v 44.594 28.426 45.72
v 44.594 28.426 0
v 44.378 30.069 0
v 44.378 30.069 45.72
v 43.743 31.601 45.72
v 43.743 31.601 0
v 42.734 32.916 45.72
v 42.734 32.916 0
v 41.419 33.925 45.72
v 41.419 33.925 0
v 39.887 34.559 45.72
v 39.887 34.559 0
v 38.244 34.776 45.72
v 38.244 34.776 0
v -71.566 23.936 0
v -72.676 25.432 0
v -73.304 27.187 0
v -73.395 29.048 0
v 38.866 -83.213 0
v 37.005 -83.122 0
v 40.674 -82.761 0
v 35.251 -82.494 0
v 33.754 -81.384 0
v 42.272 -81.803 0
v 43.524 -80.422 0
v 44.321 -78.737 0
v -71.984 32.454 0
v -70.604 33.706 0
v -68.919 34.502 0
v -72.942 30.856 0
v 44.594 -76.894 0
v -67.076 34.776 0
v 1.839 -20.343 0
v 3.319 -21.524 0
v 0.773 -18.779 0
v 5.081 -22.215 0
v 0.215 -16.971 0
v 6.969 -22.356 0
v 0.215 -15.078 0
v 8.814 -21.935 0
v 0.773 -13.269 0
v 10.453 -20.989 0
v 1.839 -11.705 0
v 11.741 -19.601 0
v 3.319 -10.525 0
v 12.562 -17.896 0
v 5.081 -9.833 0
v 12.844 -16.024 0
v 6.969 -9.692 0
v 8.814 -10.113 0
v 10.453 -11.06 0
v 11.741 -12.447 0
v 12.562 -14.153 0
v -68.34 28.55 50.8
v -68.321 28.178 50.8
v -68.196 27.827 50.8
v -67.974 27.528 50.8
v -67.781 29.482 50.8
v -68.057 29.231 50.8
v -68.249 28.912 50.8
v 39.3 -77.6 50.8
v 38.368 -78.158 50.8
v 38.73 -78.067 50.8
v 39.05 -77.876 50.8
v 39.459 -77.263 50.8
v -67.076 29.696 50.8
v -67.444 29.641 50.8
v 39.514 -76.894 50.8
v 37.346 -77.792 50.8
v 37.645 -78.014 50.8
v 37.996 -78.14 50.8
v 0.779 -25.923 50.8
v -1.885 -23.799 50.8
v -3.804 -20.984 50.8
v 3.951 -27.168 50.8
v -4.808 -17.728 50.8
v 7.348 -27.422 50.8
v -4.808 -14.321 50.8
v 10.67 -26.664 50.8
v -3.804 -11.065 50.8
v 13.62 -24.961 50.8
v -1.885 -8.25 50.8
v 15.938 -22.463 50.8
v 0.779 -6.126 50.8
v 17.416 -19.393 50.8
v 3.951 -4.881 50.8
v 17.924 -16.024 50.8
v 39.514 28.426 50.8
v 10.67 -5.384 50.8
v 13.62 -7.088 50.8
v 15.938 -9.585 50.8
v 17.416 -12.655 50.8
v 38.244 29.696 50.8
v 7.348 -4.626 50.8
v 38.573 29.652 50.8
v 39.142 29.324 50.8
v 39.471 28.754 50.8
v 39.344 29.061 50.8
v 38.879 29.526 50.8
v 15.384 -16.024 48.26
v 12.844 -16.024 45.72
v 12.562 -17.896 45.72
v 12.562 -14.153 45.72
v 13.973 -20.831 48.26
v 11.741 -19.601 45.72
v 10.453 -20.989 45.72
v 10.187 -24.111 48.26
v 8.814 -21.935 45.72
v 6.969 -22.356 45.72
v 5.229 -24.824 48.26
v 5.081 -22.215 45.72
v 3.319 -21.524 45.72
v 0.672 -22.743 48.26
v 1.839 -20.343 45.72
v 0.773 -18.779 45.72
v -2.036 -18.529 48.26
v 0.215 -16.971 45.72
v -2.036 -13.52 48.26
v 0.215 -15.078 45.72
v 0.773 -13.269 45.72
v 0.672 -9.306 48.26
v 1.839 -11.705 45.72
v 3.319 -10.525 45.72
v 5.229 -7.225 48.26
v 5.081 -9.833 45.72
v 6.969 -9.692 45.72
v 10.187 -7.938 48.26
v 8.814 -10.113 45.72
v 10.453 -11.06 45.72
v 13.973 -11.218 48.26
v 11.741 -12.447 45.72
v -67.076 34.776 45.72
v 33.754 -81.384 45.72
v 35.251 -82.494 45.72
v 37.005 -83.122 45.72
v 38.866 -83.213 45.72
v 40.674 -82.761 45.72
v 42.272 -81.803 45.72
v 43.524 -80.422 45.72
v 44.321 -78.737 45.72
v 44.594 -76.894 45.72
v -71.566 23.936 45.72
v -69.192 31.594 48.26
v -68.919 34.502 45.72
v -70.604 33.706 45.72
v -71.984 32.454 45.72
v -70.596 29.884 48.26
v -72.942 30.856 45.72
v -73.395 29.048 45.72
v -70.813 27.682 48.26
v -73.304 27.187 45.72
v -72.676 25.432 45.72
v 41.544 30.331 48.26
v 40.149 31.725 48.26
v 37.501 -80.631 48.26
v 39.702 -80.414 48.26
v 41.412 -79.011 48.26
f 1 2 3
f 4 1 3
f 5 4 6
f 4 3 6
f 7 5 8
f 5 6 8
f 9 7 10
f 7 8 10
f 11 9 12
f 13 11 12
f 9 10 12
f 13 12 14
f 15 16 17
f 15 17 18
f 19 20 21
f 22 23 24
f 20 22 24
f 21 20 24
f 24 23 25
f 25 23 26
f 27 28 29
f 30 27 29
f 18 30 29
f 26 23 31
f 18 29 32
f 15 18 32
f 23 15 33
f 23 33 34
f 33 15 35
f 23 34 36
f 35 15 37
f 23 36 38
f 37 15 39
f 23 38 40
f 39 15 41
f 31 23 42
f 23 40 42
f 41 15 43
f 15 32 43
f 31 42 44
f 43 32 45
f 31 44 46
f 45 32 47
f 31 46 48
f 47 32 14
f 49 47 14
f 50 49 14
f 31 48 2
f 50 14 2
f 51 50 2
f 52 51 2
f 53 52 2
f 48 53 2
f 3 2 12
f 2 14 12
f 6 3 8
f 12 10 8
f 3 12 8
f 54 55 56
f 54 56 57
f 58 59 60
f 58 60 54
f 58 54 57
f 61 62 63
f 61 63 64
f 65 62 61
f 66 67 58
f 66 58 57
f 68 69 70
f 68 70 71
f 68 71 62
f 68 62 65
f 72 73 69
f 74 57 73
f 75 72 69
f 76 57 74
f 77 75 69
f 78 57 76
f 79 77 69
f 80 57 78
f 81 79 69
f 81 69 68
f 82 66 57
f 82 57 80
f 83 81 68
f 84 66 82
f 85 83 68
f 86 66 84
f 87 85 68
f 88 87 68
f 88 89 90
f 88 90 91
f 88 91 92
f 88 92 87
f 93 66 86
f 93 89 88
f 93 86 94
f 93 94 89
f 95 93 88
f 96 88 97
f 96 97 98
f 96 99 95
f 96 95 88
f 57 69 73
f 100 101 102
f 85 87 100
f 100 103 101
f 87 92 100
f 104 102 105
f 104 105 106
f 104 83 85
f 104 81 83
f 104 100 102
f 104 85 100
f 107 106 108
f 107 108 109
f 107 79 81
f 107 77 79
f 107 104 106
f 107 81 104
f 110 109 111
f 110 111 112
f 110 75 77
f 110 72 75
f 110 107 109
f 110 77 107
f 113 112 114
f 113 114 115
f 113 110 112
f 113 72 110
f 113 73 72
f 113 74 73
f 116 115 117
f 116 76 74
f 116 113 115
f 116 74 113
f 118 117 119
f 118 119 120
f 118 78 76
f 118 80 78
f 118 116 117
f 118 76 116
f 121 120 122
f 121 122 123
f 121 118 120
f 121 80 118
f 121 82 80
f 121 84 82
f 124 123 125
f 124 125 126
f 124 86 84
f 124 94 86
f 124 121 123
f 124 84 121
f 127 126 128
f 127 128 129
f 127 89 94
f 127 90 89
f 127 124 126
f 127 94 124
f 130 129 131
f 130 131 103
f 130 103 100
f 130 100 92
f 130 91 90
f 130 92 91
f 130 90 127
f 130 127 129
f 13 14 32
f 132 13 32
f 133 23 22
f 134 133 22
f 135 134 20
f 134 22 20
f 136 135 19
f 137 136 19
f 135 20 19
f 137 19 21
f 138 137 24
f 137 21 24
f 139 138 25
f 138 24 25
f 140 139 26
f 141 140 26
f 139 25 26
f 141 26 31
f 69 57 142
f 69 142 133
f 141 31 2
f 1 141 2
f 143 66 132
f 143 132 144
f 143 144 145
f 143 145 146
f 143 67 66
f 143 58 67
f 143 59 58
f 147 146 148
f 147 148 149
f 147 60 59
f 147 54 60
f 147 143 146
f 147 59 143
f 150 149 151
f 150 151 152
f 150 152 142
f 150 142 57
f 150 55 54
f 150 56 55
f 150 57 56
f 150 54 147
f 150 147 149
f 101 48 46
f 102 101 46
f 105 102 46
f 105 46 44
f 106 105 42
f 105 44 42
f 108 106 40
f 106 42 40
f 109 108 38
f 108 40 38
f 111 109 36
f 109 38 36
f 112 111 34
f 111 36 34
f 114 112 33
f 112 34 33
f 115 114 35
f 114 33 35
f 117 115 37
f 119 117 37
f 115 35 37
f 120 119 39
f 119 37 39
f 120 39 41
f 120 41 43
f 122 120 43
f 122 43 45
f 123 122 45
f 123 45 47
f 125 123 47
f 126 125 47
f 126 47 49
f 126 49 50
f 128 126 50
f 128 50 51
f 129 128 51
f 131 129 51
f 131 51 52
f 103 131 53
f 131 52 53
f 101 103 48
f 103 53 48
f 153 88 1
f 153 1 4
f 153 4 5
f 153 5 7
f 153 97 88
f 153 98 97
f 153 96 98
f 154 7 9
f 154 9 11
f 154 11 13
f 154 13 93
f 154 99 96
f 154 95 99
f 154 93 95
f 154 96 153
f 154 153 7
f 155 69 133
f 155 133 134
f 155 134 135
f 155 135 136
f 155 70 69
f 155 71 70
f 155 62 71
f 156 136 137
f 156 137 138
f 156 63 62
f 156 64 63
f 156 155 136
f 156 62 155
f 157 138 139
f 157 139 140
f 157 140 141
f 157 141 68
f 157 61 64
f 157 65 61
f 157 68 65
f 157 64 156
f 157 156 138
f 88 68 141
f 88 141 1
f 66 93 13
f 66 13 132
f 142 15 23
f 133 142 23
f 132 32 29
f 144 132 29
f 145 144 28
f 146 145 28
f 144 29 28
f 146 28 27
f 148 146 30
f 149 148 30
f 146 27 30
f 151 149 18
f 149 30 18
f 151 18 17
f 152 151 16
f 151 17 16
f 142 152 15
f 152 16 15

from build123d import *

# Parameters (mm, degrees)
F1_DEPTH = 50.8
F2_SIZE  = 5.08


with BuildPart() as f1:
    # F0 (on Top) → F1 (new body)
    with BuildSketch(Plane.XY):
        with BuildLine():
            Line((38.243972, 34.775752), (-67.075772, 34.775752))
            ThreePointArc((-67.075772, 34.775752), (-72.942407, 30.855792), (-71.5659, 23.935624))
            Line((-71.5659, 23.935624), (33.753843, -81.38412))
            ThreePointArc((33.753843, -81.38412), (40.674011, -82.760627), (44.593972, -76.893992))
            Line((44.593972, -76.893992), (44.593972, 28.425752))
            ThreePointArc((44.593972, 28.425752), (42.7341, 32.91588), (38.243972, 34.775752))
        make_face()
        with BuildLine():
            ThreePointArc((0.143972, -16.024248), (6.493972, -9.674248), (12.843972, -16.024248))
            ThreePointArc((12.843972, -16.024248), (6.493972, -22.374248), (0.143972, -16.024248))
        make_face(mode=Mode.SUBTRACT)
    extrude(amount=F1_DEPTH)

    # F2
    f2_edges = [f1.edges().sort_by_distance(p)[0] for p in [
        (44.593972, -24.23412, 50.8),
        (0.143972, -16.024248, 50.8),
    ]]
    chamfer(f2_edges, length=F2_SIZE)


solid = f1.part
